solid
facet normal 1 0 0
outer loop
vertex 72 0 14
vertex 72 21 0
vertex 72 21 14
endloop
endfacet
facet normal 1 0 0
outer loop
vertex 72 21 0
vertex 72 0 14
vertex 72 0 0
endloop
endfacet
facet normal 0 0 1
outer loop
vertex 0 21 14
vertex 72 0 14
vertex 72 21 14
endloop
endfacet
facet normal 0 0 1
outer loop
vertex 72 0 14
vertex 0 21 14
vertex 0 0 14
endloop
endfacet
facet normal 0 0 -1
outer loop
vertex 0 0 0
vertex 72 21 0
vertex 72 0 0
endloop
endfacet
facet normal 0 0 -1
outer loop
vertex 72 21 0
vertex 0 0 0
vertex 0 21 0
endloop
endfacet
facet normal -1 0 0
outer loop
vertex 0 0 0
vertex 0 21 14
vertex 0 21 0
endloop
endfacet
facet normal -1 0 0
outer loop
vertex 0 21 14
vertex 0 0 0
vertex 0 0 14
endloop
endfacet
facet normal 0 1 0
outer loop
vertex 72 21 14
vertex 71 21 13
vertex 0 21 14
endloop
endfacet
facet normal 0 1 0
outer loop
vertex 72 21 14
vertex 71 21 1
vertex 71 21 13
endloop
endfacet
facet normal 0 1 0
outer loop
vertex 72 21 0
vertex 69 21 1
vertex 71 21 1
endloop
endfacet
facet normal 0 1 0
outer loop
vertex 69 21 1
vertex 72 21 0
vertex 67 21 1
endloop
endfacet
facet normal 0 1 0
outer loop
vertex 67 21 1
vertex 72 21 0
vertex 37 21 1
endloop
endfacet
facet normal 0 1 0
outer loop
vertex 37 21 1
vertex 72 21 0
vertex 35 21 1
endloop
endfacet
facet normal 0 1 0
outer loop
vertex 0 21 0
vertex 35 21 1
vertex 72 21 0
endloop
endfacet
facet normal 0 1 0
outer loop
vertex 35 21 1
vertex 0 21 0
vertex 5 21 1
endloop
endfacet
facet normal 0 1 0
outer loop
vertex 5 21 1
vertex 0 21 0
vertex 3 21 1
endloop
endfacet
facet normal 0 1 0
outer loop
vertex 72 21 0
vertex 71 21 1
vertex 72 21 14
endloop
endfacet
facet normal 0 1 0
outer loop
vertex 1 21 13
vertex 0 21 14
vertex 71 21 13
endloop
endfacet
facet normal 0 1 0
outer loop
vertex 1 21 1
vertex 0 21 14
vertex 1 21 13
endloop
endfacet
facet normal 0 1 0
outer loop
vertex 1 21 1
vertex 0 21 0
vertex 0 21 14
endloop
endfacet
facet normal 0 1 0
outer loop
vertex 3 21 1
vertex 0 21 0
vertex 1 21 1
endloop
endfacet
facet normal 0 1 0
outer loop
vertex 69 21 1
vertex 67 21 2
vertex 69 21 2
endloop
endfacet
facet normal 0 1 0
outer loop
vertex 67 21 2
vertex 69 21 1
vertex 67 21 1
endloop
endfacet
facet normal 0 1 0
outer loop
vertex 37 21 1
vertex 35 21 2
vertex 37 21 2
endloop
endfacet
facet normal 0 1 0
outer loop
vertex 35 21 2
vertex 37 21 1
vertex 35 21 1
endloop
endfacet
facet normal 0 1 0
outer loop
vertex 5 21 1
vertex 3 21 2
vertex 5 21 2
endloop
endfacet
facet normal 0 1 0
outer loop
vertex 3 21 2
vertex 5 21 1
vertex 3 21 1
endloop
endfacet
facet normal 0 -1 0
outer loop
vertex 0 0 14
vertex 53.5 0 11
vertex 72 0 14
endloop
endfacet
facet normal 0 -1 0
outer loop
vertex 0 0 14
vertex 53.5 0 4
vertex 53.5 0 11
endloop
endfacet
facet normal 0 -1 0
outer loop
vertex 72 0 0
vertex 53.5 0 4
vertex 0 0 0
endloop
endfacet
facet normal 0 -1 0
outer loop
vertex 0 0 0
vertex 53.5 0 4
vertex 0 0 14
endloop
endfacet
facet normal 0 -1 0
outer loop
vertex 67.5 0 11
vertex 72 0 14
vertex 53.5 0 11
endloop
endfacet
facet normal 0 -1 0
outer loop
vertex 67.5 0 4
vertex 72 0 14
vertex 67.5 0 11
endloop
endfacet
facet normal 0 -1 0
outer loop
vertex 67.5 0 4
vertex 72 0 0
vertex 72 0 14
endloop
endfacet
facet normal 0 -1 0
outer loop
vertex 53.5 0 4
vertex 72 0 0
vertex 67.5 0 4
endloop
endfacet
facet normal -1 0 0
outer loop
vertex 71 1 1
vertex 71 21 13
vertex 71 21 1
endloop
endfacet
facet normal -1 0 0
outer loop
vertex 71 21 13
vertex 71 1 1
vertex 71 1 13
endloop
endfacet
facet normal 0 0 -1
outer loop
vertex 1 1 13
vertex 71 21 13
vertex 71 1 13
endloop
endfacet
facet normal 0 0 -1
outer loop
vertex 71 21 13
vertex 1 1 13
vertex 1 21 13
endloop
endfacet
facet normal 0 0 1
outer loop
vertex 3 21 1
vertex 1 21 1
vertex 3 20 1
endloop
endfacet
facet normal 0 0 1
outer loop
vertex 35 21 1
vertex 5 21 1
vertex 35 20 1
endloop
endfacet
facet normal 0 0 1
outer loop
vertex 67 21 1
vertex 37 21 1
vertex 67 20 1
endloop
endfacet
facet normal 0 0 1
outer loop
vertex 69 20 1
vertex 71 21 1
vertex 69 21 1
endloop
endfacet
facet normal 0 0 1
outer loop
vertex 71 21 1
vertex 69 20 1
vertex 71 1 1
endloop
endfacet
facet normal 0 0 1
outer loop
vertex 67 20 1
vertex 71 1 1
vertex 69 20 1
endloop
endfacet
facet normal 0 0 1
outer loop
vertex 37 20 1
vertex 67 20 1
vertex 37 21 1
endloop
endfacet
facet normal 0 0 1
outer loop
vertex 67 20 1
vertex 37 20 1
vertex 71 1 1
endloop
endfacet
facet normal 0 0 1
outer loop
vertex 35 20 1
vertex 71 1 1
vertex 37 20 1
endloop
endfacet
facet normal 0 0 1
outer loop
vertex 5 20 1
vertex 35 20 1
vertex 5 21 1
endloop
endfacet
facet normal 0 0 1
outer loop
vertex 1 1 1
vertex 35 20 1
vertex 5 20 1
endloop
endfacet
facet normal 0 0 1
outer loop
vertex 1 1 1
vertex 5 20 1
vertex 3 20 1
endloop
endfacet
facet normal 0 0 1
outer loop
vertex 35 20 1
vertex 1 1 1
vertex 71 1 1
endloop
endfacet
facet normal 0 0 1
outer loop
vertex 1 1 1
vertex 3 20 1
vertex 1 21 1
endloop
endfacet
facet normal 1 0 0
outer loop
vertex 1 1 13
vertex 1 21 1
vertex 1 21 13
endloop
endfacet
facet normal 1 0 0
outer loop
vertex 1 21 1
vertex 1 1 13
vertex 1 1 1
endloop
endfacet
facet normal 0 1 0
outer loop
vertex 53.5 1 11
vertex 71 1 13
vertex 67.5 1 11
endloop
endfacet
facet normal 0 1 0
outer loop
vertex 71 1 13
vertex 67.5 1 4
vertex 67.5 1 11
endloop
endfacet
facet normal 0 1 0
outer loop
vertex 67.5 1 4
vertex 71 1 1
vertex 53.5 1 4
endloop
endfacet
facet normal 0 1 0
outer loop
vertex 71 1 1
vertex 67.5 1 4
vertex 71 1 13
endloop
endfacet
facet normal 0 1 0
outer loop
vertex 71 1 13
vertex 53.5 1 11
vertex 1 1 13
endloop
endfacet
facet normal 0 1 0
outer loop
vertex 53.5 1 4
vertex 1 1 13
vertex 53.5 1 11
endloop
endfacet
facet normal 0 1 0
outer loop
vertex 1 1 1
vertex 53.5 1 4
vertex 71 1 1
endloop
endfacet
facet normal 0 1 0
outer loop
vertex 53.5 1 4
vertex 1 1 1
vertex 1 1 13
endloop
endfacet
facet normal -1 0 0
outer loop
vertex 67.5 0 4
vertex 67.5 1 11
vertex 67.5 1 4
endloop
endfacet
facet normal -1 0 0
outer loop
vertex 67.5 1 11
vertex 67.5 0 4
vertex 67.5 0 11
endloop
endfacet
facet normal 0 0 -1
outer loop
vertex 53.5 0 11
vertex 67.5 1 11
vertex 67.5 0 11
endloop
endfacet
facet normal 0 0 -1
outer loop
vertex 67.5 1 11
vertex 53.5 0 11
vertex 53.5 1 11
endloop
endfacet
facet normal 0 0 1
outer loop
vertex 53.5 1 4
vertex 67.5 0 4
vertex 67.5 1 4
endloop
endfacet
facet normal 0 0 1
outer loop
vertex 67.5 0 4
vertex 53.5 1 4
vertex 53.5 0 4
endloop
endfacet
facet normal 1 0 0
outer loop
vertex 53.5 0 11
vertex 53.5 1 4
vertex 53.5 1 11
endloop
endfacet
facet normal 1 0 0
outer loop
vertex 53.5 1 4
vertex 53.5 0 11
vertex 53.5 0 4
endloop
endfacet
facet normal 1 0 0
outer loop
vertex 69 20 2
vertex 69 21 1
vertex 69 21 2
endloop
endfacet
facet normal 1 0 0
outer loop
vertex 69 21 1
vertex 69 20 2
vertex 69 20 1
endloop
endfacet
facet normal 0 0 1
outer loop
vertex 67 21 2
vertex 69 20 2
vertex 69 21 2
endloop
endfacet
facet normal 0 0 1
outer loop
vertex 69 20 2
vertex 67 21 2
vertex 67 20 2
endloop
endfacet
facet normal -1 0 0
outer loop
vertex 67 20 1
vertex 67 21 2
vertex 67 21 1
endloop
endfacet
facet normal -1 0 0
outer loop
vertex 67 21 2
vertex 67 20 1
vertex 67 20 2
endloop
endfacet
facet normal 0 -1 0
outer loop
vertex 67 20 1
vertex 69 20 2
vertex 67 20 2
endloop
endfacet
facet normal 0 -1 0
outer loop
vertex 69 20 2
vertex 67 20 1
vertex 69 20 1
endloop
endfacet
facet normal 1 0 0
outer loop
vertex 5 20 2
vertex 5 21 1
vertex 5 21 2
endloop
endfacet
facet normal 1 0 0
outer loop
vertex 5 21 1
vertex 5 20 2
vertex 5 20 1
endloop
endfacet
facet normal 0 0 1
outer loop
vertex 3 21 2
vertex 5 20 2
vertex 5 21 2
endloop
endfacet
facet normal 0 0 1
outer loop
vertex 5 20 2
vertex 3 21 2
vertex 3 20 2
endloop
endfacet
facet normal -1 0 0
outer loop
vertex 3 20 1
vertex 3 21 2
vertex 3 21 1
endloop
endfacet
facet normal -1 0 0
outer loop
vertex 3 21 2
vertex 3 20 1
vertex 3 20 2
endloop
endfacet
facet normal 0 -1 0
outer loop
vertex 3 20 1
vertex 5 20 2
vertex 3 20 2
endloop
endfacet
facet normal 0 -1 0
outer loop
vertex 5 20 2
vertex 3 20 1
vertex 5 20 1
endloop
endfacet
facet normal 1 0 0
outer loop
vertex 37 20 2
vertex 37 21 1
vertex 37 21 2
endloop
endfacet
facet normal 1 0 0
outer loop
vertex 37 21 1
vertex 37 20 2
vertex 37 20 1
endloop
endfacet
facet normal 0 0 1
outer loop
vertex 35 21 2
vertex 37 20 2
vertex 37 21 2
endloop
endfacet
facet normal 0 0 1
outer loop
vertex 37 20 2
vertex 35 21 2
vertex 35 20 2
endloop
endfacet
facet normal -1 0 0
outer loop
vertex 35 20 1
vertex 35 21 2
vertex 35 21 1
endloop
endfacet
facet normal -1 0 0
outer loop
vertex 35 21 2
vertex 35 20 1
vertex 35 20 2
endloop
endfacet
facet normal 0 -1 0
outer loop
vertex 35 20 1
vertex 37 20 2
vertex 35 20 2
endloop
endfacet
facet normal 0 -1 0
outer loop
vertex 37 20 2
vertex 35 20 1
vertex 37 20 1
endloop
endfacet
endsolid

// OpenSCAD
length = 72;
width = 21;
height = 14;
thickness = 1;
portWidth = 14;
portHeight = 7;
xPortOffset = 4.5;
yPortOffset = 4;

// Shell with ports
 


union() {
    difference() { 
        cube([length, width, height]);
        
        translate([thickness,thickness,thickness])
        cube([(length - thickness*2), 100, (height - thickness*2)]);
        
        xPortOffsetMirror = (length - xPortOffset - portWidth);
        
        translate([xPortOffsetMirror, -50, yPortOffset])
        cube([portWidth,100, portHeight]);
    };
    
    // clips
    translate([length - 5, width-1, 0])
    cube([2,1,2]);
    
    translate([5 - 2, width-1, 0])
    cube([2,1,2]);
    
    translate([length / 2 -1, width-1, 0])
    cube([2,1,2]);    
    
}
